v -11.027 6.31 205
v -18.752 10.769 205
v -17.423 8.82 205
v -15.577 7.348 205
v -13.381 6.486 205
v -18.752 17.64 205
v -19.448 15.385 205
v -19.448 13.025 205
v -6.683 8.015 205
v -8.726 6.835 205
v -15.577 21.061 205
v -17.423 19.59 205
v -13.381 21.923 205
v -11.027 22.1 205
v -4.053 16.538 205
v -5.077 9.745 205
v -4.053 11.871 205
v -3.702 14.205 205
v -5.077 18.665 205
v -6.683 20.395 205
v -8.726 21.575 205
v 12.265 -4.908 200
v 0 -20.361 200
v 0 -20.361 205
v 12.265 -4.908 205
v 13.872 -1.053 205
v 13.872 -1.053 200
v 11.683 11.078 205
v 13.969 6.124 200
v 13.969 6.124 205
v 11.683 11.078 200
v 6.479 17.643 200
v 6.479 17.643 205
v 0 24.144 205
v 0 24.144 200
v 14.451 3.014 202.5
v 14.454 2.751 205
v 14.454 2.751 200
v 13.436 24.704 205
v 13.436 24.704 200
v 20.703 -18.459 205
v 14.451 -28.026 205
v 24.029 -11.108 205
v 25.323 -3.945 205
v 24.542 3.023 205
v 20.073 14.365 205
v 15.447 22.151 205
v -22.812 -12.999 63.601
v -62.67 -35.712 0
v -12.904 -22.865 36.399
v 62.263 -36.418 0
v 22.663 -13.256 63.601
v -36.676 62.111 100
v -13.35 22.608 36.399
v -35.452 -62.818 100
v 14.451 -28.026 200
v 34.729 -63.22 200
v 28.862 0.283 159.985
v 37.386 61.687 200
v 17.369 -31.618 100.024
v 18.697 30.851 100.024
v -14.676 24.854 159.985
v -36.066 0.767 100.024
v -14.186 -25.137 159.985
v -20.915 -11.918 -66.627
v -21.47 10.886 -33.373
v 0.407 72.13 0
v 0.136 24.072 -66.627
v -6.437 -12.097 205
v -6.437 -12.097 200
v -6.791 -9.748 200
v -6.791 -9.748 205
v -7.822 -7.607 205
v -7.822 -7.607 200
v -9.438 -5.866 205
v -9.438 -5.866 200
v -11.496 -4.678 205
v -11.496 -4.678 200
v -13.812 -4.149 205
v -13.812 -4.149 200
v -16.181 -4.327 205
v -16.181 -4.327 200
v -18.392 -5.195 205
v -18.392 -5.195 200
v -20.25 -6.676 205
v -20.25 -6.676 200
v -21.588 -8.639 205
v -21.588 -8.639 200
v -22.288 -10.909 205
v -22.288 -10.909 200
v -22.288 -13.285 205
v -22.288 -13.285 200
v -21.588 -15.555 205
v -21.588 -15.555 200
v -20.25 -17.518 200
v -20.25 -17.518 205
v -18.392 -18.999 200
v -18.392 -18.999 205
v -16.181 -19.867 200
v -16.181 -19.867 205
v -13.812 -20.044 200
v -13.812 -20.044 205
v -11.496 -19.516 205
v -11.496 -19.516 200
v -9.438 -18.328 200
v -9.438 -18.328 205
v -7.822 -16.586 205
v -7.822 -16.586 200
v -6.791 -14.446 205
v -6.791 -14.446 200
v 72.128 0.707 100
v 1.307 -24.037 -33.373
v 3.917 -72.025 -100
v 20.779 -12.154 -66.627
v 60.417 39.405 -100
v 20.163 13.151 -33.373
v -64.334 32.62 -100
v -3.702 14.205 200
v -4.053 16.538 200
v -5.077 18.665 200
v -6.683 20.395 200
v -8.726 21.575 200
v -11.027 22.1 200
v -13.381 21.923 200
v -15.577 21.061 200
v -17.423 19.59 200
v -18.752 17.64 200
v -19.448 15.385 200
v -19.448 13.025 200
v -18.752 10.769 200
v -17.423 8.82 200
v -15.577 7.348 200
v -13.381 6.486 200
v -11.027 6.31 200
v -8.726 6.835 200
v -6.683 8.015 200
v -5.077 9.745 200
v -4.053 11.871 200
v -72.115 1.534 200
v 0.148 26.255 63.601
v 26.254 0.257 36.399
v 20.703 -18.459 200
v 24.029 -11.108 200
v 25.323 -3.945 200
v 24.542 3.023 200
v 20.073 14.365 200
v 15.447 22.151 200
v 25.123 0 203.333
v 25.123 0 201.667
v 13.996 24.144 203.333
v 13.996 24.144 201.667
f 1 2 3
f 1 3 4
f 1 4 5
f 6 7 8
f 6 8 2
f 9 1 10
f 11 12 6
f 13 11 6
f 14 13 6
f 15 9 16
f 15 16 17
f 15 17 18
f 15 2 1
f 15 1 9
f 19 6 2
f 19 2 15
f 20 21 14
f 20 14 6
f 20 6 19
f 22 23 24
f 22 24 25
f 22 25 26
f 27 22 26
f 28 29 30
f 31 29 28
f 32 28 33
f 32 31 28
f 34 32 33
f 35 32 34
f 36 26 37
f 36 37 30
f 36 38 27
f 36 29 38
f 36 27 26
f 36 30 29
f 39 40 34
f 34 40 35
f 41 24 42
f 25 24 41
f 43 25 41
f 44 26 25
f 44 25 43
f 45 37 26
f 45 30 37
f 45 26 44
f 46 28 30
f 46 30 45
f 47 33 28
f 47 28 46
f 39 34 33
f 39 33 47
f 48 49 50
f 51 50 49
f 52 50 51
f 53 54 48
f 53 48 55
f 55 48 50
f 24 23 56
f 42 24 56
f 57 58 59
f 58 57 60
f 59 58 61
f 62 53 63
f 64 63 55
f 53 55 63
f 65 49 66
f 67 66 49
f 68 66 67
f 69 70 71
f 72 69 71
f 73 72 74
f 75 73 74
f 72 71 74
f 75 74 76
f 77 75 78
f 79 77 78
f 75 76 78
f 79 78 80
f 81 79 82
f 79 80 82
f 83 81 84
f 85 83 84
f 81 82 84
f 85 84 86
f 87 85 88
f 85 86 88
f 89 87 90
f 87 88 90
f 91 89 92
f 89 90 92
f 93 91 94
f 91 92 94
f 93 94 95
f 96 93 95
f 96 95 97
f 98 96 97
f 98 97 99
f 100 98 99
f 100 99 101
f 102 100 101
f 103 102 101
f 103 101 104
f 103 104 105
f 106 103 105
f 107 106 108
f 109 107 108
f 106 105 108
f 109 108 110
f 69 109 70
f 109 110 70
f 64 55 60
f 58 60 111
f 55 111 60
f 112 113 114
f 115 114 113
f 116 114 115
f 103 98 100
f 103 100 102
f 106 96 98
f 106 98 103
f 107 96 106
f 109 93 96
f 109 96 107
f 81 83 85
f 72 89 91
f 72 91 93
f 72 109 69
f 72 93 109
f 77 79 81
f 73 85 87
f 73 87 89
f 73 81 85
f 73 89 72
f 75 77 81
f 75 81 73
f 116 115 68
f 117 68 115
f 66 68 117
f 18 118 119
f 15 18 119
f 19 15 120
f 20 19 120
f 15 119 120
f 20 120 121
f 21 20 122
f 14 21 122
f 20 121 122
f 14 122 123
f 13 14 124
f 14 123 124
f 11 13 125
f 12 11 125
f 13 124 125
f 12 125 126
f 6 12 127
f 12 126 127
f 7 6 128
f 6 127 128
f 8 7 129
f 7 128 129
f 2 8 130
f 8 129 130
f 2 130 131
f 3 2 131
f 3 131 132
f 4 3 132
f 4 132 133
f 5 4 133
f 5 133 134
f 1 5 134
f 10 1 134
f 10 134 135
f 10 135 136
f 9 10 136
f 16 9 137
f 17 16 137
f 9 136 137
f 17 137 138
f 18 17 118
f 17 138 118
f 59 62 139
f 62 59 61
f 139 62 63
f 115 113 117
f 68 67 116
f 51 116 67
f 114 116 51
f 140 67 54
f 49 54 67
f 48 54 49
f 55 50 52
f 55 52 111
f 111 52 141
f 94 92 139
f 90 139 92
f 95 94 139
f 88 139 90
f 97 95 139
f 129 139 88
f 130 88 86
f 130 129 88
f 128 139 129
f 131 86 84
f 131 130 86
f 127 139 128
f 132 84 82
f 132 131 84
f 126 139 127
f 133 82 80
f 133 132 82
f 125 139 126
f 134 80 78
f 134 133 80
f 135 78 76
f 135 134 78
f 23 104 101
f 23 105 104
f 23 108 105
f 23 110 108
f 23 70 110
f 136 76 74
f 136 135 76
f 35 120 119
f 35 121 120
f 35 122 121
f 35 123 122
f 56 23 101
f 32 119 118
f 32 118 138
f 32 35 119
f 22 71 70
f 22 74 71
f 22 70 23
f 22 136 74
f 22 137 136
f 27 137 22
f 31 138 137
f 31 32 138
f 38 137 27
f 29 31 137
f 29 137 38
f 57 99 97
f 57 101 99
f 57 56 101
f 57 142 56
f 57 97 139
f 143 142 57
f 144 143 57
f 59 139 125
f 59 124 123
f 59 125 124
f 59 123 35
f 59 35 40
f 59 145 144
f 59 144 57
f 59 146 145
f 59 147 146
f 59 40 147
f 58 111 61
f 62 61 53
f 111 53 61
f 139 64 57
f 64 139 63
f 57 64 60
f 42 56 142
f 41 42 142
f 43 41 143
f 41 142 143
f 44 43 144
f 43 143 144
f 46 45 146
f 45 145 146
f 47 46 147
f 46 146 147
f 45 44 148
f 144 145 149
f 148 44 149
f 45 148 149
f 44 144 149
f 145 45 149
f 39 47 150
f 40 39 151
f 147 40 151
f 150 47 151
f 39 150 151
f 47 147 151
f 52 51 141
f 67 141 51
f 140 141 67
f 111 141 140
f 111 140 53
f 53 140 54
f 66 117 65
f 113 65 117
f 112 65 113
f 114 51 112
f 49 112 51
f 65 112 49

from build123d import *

# Parameters (mm, degrees)
F16_R     = 7.9698515936
F16_R_2   = 7.9172343221
F17_DEPTH = 5


with BuildPart() as f3:
    # F0 (on Top) → F3 section 0
    with BuildSketch(Plane.XY, mode=Mode.PRIVATE) as f3_s0:
        Polygon((0.4073861914, 72.1302863076), (-62.6703534203, -35.7123363628), (62.2629672289, -36.4179499447), align=None)
    loft([f3_s0.sketch, Vertex(0, 0, 100)])

    # F4 (on offset) → F5 section 0
    with BuildSketch(Plane.XY.offset(100), mode=Mode.PRIVATE) as f5_s0:
        Polygon((72.1279709711, 0.706893576), (-36.6761732802, 62.1112083964), (-35.4517976909, -62.8181019724), align=None)
    loft([f5_s0.sketch, Vertex(0, 0, 0)])

    # F5_face (on face) → F10 section 0
    with BuildSketch(Plane.XY.offset(100), mode=Mode.PRIVATE) as f10_s0:
        Polygon((-35.4517976909, -62.8181019724), (72.1279709711, 0.706893576), (-36.6761732802, 62.1112083964), align=None)
    loft([f10_s0.sketch, Vertex(0, 0, 200)])

    # F3_face (on face) → F11 section 0
    with BuildSketch(Plane(origin=(0, 0, 0), x_dir=(1, 0, 0), z_dir=(0, 0, -1)), mode=Mode.PRIVATE) as f11_s0:
        Polygon((-62.6703534203, 35.7123363628), (0.4073861914, -72.1302863076), (62.2629672289, 36.4179499447), align=None)
    loft([f11_s0.sketch, Vertex(0, 0, -100)])

    # F12 (on offset) → F13 section 0
    with BuildSketch(Plane.XY.offset(200), mode=Mode.PRIVATE) as f13_s0:
        Polygon((-72.1151262546, 1.5337731971), (34.729276575, -63.2204179321), (37.3858496796, 61.686644735), align=None)
    loft([f13_s0.sketch, Vertex(0, 0, 0)])

    # F14 (on offset) → F15 section 0
    with BuildSketch(Plane.XY.offset(-100), mode=Mode.PRIVATE) as f15_s0:
        Polygon((3.9172189187, -72.0249907385), (60.4168622275, 39.404906465), (-64.3340811462, 32.6200842734), align=None)
    loft([f15_s0.sketch, Vertex(0, 0, 0)])

    # F16 (on offset) → F17 (join)
    with BuildSketch(Plane.XY.offset(200)):
        with Locations((-14.4072528929, -12.0968222618)):
            Circle(F16_R)
        with Locations((-11.618857272, 14.2046045512)):
            Circle(F16_R_2)
        with BuildLine():
            Line((0, -20.3613266349), (14.4505379722, -28.0257780105))
            add(Edge.make_bspline(
                [(14.4505379722, -28.0257780105), (20.5031350206, -19.362007973), (32.2544355779, -2.5410359414), (14.4116547637, 23.9984281751), (13.5612826949, 24.6133738576), (13.4361311793, 24.7038770467)],
                knots=[0, 0, 0, 0, 0.4752828108, 0.9227759779, 1, 1, 1, 1], degree=3))
            Line((13.4361311793, 24.7038770467), (0, 24.1440590471))
            add(Edge.make_bspline(
                [(0, -20.3613266349), (7.3122692601, -12.4437830296), (21.681873302, 3.1152674575), (7.141301884, 17.2178609781), (0, 24.1440590471)],
                knots=[0, 0, 0, 0, 0.508870616, 1, 1, 1, 1], degree=3))
        make_face()
    extrude(amount=F17_DEPTH)


solid = f3.part
